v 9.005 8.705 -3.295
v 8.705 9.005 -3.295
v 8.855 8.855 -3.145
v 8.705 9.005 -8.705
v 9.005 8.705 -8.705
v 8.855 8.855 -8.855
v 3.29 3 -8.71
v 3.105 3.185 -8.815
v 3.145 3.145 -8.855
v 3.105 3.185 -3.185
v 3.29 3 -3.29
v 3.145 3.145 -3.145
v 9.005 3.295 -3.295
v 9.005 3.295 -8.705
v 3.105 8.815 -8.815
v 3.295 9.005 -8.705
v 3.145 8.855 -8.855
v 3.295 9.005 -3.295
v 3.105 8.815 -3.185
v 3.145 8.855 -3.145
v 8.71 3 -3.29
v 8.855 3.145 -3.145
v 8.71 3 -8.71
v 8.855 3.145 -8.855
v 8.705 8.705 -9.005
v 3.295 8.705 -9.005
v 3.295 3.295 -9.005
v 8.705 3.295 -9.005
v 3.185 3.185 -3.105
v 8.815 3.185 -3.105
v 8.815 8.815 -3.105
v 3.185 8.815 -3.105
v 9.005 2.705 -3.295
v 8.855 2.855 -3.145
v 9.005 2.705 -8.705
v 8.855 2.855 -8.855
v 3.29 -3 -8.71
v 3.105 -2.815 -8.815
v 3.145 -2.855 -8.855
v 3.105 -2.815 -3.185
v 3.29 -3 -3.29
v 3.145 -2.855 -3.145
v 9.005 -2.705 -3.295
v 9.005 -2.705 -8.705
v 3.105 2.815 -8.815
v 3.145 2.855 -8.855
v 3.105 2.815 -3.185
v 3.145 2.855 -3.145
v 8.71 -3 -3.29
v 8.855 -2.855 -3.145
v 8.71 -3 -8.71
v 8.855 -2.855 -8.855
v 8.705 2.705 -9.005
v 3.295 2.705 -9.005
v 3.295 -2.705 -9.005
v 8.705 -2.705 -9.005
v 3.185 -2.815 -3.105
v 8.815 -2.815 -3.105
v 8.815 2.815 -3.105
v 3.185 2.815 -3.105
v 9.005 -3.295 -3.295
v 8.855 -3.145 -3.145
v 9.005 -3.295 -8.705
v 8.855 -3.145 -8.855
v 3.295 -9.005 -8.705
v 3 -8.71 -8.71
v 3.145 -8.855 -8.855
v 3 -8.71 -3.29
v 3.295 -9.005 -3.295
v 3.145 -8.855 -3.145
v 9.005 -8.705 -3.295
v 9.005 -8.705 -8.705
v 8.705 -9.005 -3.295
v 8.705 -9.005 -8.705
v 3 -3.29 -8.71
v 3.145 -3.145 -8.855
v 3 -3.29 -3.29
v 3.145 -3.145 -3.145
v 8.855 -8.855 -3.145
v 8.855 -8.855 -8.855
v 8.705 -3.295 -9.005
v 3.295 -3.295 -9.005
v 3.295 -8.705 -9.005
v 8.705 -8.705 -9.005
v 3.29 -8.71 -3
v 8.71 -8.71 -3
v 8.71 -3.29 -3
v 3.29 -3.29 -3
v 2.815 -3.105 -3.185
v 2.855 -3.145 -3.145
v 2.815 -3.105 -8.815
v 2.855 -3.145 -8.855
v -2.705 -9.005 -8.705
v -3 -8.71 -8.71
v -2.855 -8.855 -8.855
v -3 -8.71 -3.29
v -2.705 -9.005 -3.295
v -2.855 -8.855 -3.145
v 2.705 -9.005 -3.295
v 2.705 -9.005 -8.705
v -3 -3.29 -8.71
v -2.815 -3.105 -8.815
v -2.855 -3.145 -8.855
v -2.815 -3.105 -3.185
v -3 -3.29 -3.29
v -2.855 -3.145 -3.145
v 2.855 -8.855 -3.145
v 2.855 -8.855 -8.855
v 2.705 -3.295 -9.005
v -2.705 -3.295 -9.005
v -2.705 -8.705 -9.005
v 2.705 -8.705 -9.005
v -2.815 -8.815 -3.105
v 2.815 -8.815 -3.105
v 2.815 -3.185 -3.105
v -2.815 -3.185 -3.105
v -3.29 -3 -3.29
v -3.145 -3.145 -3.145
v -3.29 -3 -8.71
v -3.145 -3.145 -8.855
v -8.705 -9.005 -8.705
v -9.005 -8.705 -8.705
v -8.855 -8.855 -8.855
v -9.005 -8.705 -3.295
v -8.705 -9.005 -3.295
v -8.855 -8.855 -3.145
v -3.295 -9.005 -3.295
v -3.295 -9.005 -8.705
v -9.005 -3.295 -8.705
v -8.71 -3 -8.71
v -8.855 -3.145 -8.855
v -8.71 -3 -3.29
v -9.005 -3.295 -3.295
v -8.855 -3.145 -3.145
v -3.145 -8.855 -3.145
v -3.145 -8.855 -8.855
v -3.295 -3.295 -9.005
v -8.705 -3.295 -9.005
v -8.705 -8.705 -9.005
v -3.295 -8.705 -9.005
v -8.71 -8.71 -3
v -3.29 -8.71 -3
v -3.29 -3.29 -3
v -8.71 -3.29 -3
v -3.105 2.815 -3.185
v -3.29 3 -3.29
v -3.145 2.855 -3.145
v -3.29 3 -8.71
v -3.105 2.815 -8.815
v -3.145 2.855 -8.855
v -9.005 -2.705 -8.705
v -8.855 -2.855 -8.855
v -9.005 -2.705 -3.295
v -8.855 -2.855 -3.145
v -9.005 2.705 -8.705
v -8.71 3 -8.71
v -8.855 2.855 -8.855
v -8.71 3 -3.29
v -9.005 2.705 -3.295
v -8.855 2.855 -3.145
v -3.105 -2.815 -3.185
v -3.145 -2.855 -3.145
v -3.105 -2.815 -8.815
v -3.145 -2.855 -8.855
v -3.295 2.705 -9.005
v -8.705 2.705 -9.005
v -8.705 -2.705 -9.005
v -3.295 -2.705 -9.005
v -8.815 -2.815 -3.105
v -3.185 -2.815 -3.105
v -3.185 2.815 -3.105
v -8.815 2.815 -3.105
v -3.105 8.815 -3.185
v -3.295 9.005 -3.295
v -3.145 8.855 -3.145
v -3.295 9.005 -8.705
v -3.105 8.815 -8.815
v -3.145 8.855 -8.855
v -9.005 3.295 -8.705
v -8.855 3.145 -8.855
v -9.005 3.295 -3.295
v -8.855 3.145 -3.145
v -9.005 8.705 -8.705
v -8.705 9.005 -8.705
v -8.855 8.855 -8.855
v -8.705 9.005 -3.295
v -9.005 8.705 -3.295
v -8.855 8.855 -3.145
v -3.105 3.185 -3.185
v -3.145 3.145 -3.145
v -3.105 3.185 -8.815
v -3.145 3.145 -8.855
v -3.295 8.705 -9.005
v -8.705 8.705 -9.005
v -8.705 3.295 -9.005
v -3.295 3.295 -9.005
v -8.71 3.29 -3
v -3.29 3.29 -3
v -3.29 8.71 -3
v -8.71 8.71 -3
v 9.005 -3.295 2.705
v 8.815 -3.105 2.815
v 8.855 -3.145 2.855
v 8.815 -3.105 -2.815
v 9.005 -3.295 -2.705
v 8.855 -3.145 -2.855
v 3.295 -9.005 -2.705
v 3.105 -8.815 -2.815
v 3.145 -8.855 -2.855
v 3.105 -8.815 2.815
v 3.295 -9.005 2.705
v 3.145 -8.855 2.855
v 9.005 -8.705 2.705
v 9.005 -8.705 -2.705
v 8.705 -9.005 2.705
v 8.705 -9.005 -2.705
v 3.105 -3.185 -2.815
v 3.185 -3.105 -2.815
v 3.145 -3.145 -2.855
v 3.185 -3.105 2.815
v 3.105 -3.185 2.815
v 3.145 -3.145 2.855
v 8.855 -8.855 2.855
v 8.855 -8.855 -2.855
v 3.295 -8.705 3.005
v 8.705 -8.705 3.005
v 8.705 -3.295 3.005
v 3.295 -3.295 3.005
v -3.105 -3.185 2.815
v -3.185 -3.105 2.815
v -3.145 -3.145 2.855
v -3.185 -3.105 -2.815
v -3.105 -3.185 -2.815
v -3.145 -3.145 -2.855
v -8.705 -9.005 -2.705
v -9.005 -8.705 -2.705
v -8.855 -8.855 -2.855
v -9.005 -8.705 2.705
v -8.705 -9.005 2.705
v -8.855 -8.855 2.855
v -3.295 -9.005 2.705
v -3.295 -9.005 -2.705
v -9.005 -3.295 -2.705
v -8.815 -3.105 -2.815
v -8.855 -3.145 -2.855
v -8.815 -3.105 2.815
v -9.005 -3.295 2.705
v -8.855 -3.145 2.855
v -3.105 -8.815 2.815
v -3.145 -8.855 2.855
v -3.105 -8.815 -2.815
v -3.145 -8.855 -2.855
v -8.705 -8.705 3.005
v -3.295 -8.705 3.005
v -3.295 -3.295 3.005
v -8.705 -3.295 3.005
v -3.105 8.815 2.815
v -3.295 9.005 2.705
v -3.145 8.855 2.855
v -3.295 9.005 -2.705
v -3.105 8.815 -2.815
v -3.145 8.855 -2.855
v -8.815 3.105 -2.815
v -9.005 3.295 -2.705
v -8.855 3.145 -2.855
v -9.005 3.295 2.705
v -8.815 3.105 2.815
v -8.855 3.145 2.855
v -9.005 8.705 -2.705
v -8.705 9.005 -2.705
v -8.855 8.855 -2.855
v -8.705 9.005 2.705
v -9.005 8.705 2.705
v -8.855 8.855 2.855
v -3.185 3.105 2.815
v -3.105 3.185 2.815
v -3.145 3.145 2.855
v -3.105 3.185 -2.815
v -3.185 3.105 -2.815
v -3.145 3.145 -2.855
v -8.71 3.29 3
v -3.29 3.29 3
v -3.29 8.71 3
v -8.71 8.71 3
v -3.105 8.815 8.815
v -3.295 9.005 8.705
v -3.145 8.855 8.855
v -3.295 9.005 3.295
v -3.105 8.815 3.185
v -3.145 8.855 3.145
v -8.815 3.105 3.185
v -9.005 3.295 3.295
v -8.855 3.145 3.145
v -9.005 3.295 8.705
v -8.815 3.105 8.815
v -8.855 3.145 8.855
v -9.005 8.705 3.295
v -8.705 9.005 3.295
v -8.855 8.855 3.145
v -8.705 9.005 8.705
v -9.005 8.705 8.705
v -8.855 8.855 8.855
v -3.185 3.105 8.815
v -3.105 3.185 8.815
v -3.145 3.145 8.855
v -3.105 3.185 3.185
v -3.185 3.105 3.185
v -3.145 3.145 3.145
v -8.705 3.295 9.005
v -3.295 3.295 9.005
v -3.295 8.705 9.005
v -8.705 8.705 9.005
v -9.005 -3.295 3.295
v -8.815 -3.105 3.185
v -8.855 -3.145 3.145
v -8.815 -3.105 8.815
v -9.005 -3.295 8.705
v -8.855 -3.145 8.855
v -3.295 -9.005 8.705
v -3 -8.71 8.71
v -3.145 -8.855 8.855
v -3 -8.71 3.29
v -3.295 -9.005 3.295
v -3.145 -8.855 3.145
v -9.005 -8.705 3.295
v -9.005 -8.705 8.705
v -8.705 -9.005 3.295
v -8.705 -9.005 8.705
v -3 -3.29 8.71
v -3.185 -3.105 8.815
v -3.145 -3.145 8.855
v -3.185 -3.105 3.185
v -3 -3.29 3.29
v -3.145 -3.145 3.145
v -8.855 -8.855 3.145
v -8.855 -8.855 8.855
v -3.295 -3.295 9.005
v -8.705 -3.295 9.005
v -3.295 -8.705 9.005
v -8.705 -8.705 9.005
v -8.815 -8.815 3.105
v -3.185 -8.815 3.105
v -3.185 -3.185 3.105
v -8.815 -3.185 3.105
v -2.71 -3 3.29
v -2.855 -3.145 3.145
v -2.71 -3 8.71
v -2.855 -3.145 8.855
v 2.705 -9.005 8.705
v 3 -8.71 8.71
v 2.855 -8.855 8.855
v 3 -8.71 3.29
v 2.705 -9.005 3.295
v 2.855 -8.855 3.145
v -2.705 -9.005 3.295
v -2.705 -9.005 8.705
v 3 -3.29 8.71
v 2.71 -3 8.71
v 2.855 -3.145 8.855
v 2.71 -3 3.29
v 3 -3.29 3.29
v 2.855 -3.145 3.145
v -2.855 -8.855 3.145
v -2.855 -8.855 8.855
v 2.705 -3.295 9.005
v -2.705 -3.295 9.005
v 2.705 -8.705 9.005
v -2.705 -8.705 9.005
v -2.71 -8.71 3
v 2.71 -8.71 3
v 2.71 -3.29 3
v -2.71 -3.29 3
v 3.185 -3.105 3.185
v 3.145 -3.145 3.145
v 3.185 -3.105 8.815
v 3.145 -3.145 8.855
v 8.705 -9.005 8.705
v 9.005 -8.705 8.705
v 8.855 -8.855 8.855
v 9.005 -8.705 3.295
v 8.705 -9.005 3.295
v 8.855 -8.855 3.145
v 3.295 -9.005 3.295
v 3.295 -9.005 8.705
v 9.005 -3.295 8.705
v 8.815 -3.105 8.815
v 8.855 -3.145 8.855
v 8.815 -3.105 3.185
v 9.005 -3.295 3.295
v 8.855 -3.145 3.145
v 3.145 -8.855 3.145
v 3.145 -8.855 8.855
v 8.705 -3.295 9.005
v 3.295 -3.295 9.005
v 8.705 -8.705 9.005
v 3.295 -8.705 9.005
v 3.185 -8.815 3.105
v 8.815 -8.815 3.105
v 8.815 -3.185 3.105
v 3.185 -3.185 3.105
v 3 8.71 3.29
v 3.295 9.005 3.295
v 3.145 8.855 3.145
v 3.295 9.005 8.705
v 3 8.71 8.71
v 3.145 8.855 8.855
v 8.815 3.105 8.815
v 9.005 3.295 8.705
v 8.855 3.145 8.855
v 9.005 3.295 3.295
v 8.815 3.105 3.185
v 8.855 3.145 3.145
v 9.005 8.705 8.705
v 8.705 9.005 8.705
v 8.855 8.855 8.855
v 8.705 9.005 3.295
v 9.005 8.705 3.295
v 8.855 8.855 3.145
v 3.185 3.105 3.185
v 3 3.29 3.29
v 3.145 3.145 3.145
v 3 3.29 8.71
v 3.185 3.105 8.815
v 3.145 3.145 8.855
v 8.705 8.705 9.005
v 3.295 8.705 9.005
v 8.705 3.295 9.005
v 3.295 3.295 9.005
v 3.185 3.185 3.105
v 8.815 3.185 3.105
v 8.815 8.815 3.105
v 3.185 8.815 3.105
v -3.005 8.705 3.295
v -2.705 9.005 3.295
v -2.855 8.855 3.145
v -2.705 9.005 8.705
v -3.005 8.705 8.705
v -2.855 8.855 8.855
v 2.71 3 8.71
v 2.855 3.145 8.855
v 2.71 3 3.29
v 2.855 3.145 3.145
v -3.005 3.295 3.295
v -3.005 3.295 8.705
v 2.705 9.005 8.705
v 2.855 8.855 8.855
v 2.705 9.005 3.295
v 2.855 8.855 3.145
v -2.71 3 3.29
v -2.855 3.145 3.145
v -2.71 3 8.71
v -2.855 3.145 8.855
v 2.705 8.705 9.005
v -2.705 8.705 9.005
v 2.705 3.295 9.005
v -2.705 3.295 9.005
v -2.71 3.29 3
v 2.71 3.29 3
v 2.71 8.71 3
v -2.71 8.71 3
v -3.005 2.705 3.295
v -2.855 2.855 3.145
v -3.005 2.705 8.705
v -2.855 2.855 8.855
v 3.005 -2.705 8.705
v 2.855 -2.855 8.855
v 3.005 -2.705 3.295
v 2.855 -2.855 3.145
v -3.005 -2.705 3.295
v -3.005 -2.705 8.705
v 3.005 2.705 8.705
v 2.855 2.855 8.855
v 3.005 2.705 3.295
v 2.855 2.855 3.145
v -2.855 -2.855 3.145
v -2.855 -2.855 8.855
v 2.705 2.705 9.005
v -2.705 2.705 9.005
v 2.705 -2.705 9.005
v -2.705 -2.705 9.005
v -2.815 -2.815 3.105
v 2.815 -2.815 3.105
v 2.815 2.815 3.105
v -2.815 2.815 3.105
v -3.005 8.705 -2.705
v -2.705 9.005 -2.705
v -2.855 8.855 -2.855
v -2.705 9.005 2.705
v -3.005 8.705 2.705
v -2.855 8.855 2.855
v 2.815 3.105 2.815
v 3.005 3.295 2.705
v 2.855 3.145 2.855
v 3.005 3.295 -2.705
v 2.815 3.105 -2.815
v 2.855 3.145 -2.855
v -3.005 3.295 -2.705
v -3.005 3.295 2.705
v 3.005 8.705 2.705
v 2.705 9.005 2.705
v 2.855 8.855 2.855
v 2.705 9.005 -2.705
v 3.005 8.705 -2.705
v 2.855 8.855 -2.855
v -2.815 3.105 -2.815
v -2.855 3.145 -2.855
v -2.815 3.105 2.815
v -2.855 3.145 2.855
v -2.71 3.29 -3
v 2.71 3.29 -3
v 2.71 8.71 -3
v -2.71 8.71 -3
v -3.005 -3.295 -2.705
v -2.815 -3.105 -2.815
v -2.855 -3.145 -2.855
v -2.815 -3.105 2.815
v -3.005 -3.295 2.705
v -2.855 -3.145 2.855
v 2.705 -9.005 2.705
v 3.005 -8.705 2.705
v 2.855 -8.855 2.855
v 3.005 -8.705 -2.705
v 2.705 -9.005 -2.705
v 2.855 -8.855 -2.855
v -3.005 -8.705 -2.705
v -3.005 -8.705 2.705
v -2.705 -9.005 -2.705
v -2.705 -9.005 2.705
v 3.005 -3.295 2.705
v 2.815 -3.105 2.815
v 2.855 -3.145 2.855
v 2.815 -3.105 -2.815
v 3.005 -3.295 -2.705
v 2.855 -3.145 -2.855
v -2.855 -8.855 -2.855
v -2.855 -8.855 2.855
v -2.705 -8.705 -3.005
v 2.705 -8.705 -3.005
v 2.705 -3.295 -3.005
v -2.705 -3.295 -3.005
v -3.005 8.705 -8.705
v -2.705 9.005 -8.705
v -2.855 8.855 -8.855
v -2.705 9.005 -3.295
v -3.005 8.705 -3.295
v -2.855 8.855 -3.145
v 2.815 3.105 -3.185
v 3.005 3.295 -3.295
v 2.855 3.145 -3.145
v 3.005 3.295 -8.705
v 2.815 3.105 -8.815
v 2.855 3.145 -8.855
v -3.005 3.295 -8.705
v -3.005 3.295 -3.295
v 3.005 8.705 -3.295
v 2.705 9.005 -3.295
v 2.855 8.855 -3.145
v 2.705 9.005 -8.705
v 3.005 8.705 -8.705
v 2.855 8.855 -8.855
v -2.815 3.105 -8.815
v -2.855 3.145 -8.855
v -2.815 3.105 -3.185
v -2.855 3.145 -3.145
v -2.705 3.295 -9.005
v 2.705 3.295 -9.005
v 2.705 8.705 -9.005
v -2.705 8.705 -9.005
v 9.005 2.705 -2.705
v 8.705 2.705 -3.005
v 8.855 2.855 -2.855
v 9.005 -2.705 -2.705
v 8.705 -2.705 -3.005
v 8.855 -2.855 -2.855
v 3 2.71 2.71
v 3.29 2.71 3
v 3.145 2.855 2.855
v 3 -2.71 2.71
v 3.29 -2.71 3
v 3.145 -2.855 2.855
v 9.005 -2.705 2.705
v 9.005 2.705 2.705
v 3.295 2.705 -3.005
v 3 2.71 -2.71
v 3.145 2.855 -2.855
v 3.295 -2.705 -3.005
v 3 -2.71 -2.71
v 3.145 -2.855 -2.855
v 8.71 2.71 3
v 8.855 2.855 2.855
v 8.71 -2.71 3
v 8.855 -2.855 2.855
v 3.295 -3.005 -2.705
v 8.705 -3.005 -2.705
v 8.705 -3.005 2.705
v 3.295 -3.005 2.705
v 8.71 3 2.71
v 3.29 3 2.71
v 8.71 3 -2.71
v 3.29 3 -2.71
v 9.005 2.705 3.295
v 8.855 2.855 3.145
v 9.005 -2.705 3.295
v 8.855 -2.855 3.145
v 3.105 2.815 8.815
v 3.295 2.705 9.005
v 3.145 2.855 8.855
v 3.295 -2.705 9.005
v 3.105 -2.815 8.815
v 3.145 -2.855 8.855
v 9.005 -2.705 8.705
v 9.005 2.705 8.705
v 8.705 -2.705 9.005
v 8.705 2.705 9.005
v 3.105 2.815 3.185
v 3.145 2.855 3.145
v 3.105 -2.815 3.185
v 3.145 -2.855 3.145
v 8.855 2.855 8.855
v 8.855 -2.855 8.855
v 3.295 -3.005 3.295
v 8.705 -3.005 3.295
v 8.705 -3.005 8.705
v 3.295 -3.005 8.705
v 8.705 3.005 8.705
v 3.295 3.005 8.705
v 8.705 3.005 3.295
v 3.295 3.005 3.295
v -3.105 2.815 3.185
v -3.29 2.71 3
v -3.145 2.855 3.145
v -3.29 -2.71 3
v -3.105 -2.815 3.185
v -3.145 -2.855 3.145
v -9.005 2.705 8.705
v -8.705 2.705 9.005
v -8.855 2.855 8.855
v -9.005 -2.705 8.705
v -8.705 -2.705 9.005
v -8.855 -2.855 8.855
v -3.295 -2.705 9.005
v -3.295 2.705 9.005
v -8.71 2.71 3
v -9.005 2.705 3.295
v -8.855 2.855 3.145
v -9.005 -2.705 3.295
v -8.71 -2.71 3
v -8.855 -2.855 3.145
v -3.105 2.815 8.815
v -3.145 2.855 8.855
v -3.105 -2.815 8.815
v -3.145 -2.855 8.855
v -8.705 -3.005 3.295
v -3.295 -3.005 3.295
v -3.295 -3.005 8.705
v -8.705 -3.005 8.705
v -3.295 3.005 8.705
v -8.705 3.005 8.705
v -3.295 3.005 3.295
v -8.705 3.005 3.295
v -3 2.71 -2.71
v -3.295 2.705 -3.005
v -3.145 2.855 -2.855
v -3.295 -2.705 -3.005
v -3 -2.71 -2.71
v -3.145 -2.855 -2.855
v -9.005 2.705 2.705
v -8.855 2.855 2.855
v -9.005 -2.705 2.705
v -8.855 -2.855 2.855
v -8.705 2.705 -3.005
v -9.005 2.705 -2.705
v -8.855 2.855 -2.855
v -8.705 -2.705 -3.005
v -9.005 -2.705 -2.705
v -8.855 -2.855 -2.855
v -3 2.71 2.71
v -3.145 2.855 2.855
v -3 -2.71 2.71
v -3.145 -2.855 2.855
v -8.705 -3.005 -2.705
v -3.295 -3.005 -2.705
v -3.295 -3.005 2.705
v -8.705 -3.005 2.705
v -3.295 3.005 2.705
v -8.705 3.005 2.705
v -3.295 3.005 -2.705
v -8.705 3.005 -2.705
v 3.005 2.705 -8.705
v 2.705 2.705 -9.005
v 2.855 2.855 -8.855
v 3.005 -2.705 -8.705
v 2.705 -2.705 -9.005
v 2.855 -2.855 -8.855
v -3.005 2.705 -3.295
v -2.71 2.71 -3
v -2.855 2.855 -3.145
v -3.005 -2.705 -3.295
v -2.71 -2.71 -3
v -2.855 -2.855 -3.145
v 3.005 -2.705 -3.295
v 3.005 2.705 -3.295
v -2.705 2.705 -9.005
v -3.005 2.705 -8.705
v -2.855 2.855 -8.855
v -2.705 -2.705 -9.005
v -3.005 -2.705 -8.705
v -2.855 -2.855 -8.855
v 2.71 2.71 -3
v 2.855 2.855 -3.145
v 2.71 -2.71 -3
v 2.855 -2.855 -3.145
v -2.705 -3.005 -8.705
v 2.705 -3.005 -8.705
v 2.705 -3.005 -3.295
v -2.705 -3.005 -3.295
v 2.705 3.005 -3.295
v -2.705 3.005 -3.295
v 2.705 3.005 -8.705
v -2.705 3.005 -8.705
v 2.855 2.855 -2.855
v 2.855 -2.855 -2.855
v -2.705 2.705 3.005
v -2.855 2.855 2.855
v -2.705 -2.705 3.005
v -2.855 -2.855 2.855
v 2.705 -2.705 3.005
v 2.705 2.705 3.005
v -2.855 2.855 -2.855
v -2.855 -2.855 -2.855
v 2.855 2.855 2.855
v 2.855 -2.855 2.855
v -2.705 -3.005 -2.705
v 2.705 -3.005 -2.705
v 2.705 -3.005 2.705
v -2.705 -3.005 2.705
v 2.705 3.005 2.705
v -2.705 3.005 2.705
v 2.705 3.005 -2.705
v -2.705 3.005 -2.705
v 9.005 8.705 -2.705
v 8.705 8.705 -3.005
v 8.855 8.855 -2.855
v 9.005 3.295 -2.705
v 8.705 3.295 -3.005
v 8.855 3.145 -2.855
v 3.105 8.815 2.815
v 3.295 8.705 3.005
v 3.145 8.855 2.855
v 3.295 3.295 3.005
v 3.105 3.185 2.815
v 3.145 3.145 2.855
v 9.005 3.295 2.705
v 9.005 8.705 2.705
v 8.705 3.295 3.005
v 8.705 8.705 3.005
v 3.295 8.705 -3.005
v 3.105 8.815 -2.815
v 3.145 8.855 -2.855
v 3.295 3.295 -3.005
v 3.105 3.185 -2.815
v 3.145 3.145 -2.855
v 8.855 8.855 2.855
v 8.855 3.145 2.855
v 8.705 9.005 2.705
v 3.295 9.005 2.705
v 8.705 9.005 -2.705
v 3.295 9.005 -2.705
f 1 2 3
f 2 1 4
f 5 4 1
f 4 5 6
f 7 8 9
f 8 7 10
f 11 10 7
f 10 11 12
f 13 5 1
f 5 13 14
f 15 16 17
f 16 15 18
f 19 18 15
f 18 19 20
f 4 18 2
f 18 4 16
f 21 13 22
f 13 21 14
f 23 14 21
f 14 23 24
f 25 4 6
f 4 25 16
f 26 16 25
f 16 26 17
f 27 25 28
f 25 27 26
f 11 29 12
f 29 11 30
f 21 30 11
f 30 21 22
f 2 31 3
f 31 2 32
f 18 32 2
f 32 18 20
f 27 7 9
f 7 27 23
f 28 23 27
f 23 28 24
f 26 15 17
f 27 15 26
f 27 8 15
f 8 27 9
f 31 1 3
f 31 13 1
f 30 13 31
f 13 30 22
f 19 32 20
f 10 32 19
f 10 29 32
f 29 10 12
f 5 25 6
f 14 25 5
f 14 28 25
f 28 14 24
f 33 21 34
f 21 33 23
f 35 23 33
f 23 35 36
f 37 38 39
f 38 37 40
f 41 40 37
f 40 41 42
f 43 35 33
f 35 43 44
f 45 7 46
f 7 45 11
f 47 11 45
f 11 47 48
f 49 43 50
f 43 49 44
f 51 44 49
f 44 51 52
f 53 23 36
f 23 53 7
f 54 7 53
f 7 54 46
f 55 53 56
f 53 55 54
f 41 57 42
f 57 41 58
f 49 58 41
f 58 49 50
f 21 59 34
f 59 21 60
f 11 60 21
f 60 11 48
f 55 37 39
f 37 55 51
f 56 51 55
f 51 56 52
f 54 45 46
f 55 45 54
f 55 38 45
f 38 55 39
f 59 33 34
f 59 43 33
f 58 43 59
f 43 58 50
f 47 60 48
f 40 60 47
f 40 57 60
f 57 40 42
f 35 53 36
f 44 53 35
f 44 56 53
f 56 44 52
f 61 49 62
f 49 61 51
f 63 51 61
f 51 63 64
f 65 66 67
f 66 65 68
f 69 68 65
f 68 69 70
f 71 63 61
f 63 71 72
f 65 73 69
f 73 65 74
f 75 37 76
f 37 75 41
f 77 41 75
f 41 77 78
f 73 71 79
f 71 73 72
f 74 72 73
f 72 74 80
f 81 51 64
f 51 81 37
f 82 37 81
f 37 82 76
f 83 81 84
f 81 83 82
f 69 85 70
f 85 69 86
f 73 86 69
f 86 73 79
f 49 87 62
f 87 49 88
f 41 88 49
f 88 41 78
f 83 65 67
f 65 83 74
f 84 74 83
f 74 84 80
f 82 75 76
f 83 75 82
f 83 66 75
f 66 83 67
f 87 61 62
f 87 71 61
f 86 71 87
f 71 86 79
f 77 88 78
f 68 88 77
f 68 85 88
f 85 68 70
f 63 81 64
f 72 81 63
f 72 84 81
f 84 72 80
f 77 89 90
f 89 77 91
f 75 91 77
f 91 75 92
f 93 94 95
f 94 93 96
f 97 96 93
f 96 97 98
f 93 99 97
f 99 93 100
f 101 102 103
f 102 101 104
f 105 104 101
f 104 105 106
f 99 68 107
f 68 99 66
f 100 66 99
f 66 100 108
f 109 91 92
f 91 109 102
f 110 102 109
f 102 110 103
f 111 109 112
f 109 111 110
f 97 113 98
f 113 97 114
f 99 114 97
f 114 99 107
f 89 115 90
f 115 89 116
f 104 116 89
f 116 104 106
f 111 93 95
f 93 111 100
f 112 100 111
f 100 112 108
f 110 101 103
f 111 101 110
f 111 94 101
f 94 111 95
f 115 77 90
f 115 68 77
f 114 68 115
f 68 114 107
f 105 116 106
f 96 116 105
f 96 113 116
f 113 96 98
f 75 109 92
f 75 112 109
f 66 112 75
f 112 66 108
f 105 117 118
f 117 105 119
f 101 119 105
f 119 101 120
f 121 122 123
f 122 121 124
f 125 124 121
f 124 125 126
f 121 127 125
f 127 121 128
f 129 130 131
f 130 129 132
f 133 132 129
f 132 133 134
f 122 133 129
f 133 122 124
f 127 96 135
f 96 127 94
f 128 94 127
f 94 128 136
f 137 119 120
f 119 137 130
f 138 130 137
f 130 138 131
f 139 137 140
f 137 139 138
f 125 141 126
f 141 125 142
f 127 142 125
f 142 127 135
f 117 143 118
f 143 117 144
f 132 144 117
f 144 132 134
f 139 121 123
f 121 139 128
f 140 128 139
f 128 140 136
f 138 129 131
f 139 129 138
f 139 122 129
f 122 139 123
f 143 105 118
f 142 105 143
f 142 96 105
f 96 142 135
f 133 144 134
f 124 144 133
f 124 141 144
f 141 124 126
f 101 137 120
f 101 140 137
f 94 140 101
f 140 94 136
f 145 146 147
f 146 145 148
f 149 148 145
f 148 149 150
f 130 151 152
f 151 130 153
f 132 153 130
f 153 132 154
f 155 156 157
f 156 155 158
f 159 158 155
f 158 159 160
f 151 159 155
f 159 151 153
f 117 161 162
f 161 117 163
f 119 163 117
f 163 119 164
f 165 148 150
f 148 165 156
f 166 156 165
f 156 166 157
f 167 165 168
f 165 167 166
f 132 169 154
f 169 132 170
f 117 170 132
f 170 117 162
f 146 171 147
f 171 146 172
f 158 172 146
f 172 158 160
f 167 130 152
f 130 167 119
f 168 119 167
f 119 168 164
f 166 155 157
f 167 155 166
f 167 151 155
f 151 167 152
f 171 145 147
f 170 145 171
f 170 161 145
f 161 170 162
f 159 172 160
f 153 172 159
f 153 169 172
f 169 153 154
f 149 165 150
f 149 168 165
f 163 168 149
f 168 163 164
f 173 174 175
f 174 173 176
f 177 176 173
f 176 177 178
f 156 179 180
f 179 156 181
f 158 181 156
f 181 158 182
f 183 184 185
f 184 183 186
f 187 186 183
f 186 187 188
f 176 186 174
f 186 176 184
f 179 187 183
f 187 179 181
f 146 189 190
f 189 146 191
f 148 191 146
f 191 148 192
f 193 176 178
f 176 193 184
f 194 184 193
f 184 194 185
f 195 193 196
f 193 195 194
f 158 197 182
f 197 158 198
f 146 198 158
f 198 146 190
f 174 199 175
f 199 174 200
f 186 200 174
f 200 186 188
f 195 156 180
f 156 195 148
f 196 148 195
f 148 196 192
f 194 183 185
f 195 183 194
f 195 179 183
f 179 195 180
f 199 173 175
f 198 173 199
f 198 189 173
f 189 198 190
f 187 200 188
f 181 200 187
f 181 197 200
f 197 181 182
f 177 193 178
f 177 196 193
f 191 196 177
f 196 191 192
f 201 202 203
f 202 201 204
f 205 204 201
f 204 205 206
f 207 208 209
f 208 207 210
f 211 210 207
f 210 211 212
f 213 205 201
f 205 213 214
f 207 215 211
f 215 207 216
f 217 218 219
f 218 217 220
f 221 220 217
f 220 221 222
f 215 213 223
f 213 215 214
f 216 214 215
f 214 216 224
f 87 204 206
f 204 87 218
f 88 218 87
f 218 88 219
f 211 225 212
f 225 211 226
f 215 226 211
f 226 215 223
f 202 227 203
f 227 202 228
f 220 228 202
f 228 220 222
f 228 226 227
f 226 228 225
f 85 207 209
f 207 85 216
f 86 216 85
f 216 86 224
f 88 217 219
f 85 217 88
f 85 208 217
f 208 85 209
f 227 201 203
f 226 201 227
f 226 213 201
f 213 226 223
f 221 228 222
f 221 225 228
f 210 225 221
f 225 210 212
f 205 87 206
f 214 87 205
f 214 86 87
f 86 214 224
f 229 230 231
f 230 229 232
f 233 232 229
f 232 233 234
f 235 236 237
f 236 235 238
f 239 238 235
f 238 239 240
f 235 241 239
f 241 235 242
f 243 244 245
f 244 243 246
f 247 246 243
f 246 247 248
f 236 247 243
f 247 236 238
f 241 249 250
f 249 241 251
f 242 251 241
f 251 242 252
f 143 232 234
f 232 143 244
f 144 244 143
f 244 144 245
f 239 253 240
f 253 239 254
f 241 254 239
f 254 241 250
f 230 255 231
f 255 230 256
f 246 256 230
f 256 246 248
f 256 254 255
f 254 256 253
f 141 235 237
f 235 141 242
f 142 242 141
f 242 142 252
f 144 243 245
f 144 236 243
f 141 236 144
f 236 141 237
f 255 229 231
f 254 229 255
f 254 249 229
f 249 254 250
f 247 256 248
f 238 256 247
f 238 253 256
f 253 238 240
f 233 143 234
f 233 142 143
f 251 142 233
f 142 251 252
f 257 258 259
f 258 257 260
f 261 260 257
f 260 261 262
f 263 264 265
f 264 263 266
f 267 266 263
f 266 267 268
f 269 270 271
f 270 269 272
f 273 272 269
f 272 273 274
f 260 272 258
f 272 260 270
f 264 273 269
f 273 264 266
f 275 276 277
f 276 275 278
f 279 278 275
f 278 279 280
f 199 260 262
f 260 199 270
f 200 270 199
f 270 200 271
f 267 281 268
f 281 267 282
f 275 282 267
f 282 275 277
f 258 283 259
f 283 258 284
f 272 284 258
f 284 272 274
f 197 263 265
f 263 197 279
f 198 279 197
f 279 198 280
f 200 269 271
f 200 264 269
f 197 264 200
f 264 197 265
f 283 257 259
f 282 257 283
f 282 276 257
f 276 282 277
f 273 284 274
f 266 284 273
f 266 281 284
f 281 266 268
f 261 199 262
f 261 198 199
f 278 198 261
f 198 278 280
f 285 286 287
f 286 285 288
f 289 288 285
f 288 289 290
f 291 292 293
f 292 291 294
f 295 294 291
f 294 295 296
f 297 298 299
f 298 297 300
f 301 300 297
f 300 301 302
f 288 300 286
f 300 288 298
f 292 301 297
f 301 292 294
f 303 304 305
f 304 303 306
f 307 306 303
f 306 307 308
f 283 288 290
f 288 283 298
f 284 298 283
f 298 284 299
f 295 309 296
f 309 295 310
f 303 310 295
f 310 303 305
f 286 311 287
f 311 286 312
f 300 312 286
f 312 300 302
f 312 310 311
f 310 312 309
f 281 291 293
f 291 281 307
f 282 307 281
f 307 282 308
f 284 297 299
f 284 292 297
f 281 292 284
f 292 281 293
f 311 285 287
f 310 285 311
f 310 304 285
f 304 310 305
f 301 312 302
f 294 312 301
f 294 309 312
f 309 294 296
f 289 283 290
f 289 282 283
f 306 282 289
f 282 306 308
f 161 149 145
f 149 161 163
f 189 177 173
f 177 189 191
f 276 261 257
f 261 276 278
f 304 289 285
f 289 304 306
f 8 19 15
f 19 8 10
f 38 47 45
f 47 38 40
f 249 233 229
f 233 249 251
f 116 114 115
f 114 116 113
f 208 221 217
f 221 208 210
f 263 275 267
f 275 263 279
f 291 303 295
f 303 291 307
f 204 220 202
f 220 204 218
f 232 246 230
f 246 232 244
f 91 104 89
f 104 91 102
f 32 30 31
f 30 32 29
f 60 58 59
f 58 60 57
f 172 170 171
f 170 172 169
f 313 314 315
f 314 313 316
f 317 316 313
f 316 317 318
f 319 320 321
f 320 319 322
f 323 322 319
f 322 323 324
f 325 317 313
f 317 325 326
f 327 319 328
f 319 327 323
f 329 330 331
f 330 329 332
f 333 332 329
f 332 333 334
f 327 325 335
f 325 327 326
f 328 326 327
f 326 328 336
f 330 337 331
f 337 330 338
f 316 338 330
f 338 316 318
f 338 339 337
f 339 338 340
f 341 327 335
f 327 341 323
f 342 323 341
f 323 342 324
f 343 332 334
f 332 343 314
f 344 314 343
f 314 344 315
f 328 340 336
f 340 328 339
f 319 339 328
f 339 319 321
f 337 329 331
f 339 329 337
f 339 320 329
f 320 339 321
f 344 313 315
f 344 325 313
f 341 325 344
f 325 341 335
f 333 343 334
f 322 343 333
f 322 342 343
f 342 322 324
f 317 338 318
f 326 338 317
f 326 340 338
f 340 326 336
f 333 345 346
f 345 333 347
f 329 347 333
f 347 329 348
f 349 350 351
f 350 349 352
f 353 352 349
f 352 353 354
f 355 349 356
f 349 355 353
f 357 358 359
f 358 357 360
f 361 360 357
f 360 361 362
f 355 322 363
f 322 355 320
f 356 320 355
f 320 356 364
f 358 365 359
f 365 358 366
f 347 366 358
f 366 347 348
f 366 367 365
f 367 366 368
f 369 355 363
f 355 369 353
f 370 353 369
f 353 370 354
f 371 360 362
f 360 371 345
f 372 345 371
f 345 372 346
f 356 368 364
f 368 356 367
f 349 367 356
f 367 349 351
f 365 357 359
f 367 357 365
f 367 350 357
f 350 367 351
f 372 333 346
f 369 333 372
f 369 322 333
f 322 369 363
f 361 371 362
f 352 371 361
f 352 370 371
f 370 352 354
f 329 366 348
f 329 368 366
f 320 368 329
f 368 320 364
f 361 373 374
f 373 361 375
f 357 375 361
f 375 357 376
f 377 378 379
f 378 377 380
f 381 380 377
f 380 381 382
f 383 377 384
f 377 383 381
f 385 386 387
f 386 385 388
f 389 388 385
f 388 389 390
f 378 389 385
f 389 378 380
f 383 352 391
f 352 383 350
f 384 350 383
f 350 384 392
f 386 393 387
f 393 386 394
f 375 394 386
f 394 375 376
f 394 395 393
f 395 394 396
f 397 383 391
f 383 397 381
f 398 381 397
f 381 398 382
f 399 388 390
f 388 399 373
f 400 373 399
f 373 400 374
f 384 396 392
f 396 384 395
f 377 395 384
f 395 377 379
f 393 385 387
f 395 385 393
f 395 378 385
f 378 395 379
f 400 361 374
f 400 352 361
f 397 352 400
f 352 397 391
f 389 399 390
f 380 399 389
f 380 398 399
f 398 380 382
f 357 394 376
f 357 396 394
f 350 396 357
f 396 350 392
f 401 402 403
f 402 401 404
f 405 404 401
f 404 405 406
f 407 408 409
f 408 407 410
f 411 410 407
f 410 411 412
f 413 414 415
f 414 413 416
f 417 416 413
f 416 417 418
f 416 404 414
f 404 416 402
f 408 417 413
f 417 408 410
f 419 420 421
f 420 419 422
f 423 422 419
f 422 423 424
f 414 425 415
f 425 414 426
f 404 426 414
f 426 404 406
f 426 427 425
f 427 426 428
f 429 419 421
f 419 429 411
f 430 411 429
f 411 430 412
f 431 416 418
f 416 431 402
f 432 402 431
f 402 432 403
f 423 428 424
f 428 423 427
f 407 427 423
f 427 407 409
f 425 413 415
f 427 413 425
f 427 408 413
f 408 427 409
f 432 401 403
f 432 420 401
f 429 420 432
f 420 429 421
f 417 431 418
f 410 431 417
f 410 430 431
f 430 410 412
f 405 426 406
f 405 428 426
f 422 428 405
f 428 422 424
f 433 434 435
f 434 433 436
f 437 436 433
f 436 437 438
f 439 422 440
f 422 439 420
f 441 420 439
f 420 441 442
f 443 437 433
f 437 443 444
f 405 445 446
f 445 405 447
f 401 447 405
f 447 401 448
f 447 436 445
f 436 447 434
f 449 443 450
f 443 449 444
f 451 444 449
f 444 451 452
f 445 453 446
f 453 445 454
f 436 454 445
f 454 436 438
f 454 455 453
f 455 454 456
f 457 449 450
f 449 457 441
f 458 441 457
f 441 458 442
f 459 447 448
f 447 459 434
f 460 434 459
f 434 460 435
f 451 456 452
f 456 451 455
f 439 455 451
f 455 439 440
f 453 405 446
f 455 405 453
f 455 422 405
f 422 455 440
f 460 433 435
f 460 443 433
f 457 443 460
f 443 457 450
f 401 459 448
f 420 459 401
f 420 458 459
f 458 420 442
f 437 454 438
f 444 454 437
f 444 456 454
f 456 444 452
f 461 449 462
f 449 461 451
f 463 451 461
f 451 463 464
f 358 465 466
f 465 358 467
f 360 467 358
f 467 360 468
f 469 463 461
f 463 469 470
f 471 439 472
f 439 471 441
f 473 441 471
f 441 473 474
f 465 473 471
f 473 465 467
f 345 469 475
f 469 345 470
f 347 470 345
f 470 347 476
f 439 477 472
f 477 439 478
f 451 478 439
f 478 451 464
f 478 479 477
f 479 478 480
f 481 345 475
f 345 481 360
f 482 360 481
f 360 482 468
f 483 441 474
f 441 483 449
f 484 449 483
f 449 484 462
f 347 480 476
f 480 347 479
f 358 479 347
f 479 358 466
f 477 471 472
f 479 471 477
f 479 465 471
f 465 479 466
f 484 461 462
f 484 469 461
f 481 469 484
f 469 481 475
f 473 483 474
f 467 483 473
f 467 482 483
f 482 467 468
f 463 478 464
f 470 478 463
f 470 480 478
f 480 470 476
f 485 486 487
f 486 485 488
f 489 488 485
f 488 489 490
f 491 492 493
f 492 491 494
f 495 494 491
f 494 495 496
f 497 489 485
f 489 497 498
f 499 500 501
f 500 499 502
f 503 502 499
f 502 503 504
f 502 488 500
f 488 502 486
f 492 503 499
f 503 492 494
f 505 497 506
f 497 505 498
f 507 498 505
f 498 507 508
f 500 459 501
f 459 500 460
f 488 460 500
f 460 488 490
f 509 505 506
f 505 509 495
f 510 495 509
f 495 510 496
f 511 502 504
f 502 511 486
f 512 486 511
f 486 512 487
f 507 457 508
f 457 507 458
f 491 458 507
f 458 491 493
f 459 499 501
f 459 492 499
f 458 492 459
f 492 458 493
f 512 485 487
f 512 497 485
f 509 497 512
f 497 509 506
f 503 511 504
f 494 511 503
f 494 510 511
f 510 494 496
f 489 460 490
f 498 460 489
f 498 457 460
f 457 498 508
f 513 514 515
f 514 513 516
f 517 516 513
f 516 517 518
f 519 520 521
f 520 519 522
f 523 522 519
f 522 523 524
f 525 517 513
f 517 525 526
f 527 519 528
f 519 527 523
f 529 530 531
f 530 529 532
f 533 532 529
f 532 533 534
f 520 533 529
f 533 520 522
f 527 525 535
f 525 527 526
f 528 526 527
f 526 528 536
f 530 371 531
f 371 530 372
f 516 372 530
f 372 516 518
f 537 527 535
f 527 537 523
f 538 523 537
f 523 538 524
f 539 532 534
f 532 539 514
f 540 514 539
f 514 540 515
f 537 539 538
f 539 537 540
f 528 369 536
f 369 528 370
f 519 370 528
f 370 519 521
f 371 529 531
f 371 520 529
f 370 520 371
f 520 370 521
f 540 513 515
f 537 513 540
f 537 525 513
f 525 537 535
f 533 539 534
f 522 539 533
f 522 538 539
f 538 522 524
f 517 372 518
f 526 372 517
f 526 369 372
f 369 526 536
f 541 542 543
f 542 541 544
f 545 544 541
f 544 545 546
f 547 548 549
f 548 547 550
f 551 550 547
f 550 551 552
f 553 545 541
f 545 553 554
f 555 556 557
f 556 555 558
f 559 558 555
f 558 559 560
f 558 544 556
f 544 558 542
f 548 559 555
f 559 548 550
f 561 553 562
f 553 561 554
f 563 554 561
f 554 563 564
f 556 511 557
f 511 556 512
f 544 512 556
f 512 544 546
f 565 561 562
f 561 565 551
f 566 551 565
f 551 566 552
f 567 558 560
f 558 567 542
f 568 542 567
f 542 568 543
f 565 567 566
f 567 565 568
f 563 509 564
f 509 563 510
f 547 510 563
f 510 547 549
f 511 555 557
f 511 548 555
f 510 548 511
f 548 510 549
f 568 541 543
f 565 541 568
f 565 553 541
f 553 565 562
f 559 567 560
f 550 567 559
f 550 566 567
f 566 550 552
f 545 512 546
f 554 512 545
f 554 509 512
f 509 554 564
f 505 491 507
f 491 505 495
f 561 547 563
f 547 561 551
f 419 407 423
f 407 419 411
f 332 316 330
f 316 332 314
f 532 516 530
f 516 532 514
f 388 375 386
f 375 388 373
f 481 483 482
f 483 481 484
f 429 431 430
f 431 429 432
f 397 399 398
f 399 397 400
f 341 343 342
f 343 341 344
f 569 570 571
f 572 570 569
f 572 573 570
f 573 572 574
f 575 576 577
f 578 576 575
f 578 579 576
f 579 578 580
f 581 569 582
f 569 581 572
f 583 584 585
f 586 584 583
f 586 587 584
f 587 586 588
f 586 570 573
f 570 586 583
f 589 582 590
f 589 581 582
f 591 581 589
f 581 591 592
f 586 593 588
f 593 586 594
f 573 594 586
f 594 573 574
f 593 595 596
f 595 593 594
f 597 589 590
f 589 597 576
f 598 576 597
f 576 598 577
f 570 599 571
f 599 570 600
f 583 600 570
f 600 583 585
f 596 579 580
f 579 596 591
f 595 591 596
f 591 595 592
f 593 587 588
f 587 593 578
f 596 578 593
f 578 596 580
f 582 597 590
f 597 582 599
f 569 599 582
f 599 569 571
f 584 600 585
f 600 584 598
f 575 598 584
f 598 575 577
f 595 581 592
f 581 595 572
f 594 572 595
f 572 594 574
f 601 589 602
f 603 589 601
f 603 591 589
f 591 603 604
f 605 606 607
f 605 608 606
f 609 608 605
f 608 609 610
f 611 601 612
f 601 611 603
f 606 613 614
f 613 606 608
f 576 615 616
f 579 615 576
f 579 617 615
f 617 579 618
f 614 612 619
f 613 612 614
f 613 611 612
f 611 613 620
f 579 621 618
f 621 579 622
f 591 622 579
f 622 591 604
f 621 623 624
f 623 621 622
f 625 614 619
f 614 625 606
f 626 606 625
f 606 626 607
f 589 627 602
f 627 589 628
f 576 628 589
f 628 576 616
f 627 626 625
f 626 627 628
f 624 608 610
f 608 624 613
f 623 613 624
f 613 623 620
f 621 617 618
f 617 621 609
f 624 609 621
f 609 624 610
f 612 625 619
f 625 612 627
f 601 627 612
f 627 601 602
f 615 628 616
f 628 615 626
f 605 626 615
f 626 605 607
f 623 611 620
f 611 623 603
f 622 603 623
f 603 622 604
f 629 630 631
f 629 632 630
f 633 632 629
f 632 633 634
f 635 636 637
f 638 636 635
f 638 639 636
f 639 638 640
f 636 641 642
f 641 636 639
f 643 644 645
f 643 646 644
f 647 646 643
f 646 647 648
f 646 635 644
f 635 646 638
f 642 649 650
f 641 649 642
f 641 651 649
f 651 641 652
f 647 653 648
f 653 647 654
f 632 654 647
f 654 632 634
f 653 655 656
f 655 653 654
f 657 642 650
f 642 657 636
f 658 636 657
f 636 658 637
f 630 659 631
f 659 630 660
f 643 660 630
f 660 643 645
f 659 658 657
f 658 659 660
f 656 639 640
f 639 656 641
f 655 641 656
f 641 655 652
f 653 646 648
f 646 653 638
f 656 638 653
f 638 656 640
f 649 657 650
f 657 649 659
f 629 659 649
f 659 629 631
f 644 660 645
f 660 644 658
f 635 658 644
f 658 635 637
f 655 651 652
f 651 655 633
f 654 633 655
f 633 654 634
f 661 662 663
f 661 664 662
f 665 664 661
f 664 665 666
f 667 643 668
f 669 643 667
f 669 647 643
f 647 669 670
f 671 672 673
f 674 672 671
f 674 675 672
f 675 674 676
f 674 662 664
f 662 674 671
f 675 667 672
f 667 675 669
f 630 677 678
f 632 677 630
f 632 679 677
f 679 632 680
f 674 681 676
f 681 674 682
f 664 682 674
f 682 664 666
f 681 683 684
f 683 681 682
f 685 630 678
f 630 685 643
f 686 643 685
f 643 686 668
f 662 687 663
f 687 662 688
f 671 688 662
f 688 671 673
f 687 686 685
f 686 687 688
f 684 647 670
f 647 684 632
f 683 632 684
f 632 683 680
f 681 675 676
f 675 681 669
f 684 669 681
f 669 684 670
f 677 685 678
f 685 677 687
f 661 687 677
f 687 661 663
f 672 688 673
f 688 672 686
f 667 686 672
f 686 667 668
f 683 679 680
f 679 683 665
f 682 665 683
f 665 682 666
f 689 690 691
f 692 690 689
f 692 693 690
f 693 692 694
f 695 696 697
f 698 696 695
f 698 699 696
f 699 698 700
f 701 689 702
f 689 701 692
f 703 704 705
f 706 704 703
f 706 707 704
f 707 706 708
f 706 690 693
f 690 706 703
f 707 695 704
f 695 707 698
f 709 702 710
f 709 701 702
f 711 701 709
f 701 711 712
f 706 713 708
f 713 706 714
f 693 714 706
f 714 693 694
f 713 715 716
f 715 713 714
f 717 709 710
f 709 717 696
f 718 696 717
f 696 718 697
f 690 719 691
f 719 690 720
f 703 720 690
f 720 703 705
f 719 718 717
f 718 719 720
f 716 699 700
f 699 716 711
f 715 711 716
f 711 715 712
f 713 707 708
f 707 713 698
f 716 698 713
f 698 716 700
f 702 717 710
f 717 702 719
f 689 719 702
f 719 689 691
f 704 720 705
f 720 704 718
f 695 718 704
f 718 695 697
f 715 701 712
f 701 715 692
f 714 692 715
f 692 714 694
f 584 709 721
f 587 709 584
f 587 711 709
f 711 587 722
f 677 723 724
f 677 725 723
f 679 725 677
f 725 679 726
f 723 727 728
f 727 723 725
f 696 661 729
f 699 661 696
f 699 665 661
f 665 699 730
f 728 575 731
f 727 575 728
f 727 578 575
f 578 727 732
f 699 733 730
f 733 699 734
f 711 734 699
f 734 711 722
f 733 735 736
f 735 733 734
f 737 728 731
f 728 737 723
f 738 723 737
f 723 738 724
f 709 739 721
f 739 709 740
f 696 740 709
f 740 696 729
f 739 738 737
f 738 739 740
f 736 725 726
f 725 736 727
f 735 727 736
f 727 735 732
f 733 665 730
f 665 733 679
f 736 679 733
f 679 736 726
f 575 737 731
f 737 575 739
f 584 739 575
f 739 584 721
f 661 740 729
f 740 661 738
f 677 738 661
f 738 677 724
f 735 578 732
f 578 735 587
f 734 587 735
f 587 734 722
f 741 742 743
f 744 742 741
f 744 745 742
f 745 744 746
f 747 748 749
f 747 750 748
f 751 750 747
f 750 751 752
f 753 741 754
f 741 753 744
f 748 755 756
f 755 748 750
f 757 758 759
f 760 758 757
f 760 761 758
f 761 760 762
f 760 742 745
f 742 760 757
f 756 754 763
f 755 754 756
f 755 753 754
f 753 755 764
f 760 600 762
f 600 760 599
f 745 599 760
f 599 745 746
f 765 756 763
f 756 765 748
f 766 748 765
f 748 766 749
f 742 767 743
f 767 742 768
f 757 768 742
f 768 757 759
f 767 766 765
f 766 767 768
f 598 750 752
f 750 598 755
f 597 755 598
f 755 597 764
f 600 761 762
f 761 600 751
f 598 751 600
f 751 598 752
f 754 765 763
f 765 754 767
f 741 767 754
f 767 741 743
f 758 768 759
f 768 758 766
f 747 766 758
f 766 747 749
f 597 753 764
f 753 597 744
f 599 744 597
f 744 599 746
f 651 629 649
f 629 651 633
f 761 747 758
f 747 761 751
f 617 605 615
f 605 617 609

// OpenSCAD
/* [Global] */
/* [Settings] */
part="assembled"; //[first:Piece 1,second:Piece 2,third:Piece 3,assembled:All assembled]
//of the assembled cube
total_size=18;
cube_size=total_size/3;
//between the parts
gap=0.2;//[0:0.01:0.5]
//reciprocal size of the chamfer
chamfer_size=20; //[4:50]
corner=cube_size/chamfer_size; //<=cube_size/4

/* [Hidden] */
eps=0.01;

print_part();


module print_part() {
	if (part == "first") {
		final_piece1();
	} else if (part == "second") {
		final_piece2();
	} else if (part == "third") {
		final_piece3();
	} else {
		assembled();
	}
}

module piece1(chamfer=true)
{
    set_cube(1,1,-1,chamfer);
    set_cube(1,0,-1,chamfer);
    set_cube(1,-1,-1,chamfer);
    set_cube(0,-1,-1,chamfer);
    set_cube(-1,-1,-1,chamfer);
    set_cube(-1,0,-1,chamfer);
    set_cube(-1,1,-1,chamfer);
    set_cube(1,-1,0,chamfer);
    set_cube(-1,-1,0,chamfer);
    set_cube(-1,1,0,chamfer);
    set_cube(-1,1,1,chamfer);
}
module piece2(chamfer=true)
{
    set_cube(-1,1,-1,chamfer);
    set_cube(0,1,-1,chamfer);
    set_cube(0,0,-1,chamfer);
    set_cube(1,-1,-1,chamfer);
    set_cube(0,-1,-1,chamfer);
    set_cube(-1,-1,-1,chamfer);
    set_cube(0,1,0,chamfer);
    set_cube(0,-1,0,chamfer);
    set_cube(0,1,1,chamfer);
}
module piece3(chamfer=true)
{
    set_cube(1,0,-1,chamfer);
    set_cube(1,-1,-1,chamfer);
    set_cube(-1,-1,-1,chamfer);
    set_cube(-1,0,-1,chamfer);
    set_cube(0,0,-1,chamfer);
    set_cube(0,1,-1,chamfer);
    set_cube(1,0,0,chamfer);
}

module assembled()
{
    color("red")
    final_piece1();
    color("green")
    rotate([180,0,180])
    final_piece2();
    color("blue")
    translate([0,cube_size,0])
    rotate([-90,0,0])
    final_piece3();
}

module set_cube(x,y,z,chamfer=true)
{
    translate([x*cube_size,y*cube_size,z*cube_size])
    if (chamfer)
        chamfer_cube(cube_size+eps,cube_size+eps,cube_size+eps,corner);
    else
        cube([cube_size+eps,cube_size+eps,cube_size+eps],center=true);
}

module chamfer_cube(x,y,z,delta)
{
    intersection()
    {
    size=x;
        linear_extrude(z,center=true)
            chamfer_square(x,y,delta);
        rotate([0,90,0])
            linear_extrude(x,center=true)
            chamfer_square(z,y,delta);
        rotate([90,0,0])
            linear_extrude(y,center=true)
            chamfer_square(x,z,delta);
    }
}

module chamfer_square(x,y,delta)
{
    offset(r=-delta,chamfer=true){
        square([x,y+2*delta],center=true);
        square([x+2*delta,y],center=true);
    }
}

module final_piece1()
{
    difference() //for the gap
    {
        piece1();
        scale(1+gap/cube_size)
        {
        rotate([180,0,180])
            piece2(chamfer=false);
        translate([0,cube_size,0])
            rotate([-90,0,0])
                piece3(chamfer=false);
        }
    }
}

module final_piece2()
{
    difference() //for the gap
    {
        piece2();
        rotate([180,0,180])
        scale(1+gap/cube_size)
        {
            piece1(chamfer=false);
            translate([0,cube_size,0])
                rotate([-90,0,0])
                    piece3(chamfer=false);
        }
    }
}

module final_piece3()
{
    difference() //for the gap
    {
        piece3();
        translate([0,0,-cube_size])
        rotate([90,0,0])
        scale(1+gap/cube_size)
        {
            piece1(chamfer=false);
        rotate([180,0,180])
            piece2(chamfer=false);
        }
    }
}
